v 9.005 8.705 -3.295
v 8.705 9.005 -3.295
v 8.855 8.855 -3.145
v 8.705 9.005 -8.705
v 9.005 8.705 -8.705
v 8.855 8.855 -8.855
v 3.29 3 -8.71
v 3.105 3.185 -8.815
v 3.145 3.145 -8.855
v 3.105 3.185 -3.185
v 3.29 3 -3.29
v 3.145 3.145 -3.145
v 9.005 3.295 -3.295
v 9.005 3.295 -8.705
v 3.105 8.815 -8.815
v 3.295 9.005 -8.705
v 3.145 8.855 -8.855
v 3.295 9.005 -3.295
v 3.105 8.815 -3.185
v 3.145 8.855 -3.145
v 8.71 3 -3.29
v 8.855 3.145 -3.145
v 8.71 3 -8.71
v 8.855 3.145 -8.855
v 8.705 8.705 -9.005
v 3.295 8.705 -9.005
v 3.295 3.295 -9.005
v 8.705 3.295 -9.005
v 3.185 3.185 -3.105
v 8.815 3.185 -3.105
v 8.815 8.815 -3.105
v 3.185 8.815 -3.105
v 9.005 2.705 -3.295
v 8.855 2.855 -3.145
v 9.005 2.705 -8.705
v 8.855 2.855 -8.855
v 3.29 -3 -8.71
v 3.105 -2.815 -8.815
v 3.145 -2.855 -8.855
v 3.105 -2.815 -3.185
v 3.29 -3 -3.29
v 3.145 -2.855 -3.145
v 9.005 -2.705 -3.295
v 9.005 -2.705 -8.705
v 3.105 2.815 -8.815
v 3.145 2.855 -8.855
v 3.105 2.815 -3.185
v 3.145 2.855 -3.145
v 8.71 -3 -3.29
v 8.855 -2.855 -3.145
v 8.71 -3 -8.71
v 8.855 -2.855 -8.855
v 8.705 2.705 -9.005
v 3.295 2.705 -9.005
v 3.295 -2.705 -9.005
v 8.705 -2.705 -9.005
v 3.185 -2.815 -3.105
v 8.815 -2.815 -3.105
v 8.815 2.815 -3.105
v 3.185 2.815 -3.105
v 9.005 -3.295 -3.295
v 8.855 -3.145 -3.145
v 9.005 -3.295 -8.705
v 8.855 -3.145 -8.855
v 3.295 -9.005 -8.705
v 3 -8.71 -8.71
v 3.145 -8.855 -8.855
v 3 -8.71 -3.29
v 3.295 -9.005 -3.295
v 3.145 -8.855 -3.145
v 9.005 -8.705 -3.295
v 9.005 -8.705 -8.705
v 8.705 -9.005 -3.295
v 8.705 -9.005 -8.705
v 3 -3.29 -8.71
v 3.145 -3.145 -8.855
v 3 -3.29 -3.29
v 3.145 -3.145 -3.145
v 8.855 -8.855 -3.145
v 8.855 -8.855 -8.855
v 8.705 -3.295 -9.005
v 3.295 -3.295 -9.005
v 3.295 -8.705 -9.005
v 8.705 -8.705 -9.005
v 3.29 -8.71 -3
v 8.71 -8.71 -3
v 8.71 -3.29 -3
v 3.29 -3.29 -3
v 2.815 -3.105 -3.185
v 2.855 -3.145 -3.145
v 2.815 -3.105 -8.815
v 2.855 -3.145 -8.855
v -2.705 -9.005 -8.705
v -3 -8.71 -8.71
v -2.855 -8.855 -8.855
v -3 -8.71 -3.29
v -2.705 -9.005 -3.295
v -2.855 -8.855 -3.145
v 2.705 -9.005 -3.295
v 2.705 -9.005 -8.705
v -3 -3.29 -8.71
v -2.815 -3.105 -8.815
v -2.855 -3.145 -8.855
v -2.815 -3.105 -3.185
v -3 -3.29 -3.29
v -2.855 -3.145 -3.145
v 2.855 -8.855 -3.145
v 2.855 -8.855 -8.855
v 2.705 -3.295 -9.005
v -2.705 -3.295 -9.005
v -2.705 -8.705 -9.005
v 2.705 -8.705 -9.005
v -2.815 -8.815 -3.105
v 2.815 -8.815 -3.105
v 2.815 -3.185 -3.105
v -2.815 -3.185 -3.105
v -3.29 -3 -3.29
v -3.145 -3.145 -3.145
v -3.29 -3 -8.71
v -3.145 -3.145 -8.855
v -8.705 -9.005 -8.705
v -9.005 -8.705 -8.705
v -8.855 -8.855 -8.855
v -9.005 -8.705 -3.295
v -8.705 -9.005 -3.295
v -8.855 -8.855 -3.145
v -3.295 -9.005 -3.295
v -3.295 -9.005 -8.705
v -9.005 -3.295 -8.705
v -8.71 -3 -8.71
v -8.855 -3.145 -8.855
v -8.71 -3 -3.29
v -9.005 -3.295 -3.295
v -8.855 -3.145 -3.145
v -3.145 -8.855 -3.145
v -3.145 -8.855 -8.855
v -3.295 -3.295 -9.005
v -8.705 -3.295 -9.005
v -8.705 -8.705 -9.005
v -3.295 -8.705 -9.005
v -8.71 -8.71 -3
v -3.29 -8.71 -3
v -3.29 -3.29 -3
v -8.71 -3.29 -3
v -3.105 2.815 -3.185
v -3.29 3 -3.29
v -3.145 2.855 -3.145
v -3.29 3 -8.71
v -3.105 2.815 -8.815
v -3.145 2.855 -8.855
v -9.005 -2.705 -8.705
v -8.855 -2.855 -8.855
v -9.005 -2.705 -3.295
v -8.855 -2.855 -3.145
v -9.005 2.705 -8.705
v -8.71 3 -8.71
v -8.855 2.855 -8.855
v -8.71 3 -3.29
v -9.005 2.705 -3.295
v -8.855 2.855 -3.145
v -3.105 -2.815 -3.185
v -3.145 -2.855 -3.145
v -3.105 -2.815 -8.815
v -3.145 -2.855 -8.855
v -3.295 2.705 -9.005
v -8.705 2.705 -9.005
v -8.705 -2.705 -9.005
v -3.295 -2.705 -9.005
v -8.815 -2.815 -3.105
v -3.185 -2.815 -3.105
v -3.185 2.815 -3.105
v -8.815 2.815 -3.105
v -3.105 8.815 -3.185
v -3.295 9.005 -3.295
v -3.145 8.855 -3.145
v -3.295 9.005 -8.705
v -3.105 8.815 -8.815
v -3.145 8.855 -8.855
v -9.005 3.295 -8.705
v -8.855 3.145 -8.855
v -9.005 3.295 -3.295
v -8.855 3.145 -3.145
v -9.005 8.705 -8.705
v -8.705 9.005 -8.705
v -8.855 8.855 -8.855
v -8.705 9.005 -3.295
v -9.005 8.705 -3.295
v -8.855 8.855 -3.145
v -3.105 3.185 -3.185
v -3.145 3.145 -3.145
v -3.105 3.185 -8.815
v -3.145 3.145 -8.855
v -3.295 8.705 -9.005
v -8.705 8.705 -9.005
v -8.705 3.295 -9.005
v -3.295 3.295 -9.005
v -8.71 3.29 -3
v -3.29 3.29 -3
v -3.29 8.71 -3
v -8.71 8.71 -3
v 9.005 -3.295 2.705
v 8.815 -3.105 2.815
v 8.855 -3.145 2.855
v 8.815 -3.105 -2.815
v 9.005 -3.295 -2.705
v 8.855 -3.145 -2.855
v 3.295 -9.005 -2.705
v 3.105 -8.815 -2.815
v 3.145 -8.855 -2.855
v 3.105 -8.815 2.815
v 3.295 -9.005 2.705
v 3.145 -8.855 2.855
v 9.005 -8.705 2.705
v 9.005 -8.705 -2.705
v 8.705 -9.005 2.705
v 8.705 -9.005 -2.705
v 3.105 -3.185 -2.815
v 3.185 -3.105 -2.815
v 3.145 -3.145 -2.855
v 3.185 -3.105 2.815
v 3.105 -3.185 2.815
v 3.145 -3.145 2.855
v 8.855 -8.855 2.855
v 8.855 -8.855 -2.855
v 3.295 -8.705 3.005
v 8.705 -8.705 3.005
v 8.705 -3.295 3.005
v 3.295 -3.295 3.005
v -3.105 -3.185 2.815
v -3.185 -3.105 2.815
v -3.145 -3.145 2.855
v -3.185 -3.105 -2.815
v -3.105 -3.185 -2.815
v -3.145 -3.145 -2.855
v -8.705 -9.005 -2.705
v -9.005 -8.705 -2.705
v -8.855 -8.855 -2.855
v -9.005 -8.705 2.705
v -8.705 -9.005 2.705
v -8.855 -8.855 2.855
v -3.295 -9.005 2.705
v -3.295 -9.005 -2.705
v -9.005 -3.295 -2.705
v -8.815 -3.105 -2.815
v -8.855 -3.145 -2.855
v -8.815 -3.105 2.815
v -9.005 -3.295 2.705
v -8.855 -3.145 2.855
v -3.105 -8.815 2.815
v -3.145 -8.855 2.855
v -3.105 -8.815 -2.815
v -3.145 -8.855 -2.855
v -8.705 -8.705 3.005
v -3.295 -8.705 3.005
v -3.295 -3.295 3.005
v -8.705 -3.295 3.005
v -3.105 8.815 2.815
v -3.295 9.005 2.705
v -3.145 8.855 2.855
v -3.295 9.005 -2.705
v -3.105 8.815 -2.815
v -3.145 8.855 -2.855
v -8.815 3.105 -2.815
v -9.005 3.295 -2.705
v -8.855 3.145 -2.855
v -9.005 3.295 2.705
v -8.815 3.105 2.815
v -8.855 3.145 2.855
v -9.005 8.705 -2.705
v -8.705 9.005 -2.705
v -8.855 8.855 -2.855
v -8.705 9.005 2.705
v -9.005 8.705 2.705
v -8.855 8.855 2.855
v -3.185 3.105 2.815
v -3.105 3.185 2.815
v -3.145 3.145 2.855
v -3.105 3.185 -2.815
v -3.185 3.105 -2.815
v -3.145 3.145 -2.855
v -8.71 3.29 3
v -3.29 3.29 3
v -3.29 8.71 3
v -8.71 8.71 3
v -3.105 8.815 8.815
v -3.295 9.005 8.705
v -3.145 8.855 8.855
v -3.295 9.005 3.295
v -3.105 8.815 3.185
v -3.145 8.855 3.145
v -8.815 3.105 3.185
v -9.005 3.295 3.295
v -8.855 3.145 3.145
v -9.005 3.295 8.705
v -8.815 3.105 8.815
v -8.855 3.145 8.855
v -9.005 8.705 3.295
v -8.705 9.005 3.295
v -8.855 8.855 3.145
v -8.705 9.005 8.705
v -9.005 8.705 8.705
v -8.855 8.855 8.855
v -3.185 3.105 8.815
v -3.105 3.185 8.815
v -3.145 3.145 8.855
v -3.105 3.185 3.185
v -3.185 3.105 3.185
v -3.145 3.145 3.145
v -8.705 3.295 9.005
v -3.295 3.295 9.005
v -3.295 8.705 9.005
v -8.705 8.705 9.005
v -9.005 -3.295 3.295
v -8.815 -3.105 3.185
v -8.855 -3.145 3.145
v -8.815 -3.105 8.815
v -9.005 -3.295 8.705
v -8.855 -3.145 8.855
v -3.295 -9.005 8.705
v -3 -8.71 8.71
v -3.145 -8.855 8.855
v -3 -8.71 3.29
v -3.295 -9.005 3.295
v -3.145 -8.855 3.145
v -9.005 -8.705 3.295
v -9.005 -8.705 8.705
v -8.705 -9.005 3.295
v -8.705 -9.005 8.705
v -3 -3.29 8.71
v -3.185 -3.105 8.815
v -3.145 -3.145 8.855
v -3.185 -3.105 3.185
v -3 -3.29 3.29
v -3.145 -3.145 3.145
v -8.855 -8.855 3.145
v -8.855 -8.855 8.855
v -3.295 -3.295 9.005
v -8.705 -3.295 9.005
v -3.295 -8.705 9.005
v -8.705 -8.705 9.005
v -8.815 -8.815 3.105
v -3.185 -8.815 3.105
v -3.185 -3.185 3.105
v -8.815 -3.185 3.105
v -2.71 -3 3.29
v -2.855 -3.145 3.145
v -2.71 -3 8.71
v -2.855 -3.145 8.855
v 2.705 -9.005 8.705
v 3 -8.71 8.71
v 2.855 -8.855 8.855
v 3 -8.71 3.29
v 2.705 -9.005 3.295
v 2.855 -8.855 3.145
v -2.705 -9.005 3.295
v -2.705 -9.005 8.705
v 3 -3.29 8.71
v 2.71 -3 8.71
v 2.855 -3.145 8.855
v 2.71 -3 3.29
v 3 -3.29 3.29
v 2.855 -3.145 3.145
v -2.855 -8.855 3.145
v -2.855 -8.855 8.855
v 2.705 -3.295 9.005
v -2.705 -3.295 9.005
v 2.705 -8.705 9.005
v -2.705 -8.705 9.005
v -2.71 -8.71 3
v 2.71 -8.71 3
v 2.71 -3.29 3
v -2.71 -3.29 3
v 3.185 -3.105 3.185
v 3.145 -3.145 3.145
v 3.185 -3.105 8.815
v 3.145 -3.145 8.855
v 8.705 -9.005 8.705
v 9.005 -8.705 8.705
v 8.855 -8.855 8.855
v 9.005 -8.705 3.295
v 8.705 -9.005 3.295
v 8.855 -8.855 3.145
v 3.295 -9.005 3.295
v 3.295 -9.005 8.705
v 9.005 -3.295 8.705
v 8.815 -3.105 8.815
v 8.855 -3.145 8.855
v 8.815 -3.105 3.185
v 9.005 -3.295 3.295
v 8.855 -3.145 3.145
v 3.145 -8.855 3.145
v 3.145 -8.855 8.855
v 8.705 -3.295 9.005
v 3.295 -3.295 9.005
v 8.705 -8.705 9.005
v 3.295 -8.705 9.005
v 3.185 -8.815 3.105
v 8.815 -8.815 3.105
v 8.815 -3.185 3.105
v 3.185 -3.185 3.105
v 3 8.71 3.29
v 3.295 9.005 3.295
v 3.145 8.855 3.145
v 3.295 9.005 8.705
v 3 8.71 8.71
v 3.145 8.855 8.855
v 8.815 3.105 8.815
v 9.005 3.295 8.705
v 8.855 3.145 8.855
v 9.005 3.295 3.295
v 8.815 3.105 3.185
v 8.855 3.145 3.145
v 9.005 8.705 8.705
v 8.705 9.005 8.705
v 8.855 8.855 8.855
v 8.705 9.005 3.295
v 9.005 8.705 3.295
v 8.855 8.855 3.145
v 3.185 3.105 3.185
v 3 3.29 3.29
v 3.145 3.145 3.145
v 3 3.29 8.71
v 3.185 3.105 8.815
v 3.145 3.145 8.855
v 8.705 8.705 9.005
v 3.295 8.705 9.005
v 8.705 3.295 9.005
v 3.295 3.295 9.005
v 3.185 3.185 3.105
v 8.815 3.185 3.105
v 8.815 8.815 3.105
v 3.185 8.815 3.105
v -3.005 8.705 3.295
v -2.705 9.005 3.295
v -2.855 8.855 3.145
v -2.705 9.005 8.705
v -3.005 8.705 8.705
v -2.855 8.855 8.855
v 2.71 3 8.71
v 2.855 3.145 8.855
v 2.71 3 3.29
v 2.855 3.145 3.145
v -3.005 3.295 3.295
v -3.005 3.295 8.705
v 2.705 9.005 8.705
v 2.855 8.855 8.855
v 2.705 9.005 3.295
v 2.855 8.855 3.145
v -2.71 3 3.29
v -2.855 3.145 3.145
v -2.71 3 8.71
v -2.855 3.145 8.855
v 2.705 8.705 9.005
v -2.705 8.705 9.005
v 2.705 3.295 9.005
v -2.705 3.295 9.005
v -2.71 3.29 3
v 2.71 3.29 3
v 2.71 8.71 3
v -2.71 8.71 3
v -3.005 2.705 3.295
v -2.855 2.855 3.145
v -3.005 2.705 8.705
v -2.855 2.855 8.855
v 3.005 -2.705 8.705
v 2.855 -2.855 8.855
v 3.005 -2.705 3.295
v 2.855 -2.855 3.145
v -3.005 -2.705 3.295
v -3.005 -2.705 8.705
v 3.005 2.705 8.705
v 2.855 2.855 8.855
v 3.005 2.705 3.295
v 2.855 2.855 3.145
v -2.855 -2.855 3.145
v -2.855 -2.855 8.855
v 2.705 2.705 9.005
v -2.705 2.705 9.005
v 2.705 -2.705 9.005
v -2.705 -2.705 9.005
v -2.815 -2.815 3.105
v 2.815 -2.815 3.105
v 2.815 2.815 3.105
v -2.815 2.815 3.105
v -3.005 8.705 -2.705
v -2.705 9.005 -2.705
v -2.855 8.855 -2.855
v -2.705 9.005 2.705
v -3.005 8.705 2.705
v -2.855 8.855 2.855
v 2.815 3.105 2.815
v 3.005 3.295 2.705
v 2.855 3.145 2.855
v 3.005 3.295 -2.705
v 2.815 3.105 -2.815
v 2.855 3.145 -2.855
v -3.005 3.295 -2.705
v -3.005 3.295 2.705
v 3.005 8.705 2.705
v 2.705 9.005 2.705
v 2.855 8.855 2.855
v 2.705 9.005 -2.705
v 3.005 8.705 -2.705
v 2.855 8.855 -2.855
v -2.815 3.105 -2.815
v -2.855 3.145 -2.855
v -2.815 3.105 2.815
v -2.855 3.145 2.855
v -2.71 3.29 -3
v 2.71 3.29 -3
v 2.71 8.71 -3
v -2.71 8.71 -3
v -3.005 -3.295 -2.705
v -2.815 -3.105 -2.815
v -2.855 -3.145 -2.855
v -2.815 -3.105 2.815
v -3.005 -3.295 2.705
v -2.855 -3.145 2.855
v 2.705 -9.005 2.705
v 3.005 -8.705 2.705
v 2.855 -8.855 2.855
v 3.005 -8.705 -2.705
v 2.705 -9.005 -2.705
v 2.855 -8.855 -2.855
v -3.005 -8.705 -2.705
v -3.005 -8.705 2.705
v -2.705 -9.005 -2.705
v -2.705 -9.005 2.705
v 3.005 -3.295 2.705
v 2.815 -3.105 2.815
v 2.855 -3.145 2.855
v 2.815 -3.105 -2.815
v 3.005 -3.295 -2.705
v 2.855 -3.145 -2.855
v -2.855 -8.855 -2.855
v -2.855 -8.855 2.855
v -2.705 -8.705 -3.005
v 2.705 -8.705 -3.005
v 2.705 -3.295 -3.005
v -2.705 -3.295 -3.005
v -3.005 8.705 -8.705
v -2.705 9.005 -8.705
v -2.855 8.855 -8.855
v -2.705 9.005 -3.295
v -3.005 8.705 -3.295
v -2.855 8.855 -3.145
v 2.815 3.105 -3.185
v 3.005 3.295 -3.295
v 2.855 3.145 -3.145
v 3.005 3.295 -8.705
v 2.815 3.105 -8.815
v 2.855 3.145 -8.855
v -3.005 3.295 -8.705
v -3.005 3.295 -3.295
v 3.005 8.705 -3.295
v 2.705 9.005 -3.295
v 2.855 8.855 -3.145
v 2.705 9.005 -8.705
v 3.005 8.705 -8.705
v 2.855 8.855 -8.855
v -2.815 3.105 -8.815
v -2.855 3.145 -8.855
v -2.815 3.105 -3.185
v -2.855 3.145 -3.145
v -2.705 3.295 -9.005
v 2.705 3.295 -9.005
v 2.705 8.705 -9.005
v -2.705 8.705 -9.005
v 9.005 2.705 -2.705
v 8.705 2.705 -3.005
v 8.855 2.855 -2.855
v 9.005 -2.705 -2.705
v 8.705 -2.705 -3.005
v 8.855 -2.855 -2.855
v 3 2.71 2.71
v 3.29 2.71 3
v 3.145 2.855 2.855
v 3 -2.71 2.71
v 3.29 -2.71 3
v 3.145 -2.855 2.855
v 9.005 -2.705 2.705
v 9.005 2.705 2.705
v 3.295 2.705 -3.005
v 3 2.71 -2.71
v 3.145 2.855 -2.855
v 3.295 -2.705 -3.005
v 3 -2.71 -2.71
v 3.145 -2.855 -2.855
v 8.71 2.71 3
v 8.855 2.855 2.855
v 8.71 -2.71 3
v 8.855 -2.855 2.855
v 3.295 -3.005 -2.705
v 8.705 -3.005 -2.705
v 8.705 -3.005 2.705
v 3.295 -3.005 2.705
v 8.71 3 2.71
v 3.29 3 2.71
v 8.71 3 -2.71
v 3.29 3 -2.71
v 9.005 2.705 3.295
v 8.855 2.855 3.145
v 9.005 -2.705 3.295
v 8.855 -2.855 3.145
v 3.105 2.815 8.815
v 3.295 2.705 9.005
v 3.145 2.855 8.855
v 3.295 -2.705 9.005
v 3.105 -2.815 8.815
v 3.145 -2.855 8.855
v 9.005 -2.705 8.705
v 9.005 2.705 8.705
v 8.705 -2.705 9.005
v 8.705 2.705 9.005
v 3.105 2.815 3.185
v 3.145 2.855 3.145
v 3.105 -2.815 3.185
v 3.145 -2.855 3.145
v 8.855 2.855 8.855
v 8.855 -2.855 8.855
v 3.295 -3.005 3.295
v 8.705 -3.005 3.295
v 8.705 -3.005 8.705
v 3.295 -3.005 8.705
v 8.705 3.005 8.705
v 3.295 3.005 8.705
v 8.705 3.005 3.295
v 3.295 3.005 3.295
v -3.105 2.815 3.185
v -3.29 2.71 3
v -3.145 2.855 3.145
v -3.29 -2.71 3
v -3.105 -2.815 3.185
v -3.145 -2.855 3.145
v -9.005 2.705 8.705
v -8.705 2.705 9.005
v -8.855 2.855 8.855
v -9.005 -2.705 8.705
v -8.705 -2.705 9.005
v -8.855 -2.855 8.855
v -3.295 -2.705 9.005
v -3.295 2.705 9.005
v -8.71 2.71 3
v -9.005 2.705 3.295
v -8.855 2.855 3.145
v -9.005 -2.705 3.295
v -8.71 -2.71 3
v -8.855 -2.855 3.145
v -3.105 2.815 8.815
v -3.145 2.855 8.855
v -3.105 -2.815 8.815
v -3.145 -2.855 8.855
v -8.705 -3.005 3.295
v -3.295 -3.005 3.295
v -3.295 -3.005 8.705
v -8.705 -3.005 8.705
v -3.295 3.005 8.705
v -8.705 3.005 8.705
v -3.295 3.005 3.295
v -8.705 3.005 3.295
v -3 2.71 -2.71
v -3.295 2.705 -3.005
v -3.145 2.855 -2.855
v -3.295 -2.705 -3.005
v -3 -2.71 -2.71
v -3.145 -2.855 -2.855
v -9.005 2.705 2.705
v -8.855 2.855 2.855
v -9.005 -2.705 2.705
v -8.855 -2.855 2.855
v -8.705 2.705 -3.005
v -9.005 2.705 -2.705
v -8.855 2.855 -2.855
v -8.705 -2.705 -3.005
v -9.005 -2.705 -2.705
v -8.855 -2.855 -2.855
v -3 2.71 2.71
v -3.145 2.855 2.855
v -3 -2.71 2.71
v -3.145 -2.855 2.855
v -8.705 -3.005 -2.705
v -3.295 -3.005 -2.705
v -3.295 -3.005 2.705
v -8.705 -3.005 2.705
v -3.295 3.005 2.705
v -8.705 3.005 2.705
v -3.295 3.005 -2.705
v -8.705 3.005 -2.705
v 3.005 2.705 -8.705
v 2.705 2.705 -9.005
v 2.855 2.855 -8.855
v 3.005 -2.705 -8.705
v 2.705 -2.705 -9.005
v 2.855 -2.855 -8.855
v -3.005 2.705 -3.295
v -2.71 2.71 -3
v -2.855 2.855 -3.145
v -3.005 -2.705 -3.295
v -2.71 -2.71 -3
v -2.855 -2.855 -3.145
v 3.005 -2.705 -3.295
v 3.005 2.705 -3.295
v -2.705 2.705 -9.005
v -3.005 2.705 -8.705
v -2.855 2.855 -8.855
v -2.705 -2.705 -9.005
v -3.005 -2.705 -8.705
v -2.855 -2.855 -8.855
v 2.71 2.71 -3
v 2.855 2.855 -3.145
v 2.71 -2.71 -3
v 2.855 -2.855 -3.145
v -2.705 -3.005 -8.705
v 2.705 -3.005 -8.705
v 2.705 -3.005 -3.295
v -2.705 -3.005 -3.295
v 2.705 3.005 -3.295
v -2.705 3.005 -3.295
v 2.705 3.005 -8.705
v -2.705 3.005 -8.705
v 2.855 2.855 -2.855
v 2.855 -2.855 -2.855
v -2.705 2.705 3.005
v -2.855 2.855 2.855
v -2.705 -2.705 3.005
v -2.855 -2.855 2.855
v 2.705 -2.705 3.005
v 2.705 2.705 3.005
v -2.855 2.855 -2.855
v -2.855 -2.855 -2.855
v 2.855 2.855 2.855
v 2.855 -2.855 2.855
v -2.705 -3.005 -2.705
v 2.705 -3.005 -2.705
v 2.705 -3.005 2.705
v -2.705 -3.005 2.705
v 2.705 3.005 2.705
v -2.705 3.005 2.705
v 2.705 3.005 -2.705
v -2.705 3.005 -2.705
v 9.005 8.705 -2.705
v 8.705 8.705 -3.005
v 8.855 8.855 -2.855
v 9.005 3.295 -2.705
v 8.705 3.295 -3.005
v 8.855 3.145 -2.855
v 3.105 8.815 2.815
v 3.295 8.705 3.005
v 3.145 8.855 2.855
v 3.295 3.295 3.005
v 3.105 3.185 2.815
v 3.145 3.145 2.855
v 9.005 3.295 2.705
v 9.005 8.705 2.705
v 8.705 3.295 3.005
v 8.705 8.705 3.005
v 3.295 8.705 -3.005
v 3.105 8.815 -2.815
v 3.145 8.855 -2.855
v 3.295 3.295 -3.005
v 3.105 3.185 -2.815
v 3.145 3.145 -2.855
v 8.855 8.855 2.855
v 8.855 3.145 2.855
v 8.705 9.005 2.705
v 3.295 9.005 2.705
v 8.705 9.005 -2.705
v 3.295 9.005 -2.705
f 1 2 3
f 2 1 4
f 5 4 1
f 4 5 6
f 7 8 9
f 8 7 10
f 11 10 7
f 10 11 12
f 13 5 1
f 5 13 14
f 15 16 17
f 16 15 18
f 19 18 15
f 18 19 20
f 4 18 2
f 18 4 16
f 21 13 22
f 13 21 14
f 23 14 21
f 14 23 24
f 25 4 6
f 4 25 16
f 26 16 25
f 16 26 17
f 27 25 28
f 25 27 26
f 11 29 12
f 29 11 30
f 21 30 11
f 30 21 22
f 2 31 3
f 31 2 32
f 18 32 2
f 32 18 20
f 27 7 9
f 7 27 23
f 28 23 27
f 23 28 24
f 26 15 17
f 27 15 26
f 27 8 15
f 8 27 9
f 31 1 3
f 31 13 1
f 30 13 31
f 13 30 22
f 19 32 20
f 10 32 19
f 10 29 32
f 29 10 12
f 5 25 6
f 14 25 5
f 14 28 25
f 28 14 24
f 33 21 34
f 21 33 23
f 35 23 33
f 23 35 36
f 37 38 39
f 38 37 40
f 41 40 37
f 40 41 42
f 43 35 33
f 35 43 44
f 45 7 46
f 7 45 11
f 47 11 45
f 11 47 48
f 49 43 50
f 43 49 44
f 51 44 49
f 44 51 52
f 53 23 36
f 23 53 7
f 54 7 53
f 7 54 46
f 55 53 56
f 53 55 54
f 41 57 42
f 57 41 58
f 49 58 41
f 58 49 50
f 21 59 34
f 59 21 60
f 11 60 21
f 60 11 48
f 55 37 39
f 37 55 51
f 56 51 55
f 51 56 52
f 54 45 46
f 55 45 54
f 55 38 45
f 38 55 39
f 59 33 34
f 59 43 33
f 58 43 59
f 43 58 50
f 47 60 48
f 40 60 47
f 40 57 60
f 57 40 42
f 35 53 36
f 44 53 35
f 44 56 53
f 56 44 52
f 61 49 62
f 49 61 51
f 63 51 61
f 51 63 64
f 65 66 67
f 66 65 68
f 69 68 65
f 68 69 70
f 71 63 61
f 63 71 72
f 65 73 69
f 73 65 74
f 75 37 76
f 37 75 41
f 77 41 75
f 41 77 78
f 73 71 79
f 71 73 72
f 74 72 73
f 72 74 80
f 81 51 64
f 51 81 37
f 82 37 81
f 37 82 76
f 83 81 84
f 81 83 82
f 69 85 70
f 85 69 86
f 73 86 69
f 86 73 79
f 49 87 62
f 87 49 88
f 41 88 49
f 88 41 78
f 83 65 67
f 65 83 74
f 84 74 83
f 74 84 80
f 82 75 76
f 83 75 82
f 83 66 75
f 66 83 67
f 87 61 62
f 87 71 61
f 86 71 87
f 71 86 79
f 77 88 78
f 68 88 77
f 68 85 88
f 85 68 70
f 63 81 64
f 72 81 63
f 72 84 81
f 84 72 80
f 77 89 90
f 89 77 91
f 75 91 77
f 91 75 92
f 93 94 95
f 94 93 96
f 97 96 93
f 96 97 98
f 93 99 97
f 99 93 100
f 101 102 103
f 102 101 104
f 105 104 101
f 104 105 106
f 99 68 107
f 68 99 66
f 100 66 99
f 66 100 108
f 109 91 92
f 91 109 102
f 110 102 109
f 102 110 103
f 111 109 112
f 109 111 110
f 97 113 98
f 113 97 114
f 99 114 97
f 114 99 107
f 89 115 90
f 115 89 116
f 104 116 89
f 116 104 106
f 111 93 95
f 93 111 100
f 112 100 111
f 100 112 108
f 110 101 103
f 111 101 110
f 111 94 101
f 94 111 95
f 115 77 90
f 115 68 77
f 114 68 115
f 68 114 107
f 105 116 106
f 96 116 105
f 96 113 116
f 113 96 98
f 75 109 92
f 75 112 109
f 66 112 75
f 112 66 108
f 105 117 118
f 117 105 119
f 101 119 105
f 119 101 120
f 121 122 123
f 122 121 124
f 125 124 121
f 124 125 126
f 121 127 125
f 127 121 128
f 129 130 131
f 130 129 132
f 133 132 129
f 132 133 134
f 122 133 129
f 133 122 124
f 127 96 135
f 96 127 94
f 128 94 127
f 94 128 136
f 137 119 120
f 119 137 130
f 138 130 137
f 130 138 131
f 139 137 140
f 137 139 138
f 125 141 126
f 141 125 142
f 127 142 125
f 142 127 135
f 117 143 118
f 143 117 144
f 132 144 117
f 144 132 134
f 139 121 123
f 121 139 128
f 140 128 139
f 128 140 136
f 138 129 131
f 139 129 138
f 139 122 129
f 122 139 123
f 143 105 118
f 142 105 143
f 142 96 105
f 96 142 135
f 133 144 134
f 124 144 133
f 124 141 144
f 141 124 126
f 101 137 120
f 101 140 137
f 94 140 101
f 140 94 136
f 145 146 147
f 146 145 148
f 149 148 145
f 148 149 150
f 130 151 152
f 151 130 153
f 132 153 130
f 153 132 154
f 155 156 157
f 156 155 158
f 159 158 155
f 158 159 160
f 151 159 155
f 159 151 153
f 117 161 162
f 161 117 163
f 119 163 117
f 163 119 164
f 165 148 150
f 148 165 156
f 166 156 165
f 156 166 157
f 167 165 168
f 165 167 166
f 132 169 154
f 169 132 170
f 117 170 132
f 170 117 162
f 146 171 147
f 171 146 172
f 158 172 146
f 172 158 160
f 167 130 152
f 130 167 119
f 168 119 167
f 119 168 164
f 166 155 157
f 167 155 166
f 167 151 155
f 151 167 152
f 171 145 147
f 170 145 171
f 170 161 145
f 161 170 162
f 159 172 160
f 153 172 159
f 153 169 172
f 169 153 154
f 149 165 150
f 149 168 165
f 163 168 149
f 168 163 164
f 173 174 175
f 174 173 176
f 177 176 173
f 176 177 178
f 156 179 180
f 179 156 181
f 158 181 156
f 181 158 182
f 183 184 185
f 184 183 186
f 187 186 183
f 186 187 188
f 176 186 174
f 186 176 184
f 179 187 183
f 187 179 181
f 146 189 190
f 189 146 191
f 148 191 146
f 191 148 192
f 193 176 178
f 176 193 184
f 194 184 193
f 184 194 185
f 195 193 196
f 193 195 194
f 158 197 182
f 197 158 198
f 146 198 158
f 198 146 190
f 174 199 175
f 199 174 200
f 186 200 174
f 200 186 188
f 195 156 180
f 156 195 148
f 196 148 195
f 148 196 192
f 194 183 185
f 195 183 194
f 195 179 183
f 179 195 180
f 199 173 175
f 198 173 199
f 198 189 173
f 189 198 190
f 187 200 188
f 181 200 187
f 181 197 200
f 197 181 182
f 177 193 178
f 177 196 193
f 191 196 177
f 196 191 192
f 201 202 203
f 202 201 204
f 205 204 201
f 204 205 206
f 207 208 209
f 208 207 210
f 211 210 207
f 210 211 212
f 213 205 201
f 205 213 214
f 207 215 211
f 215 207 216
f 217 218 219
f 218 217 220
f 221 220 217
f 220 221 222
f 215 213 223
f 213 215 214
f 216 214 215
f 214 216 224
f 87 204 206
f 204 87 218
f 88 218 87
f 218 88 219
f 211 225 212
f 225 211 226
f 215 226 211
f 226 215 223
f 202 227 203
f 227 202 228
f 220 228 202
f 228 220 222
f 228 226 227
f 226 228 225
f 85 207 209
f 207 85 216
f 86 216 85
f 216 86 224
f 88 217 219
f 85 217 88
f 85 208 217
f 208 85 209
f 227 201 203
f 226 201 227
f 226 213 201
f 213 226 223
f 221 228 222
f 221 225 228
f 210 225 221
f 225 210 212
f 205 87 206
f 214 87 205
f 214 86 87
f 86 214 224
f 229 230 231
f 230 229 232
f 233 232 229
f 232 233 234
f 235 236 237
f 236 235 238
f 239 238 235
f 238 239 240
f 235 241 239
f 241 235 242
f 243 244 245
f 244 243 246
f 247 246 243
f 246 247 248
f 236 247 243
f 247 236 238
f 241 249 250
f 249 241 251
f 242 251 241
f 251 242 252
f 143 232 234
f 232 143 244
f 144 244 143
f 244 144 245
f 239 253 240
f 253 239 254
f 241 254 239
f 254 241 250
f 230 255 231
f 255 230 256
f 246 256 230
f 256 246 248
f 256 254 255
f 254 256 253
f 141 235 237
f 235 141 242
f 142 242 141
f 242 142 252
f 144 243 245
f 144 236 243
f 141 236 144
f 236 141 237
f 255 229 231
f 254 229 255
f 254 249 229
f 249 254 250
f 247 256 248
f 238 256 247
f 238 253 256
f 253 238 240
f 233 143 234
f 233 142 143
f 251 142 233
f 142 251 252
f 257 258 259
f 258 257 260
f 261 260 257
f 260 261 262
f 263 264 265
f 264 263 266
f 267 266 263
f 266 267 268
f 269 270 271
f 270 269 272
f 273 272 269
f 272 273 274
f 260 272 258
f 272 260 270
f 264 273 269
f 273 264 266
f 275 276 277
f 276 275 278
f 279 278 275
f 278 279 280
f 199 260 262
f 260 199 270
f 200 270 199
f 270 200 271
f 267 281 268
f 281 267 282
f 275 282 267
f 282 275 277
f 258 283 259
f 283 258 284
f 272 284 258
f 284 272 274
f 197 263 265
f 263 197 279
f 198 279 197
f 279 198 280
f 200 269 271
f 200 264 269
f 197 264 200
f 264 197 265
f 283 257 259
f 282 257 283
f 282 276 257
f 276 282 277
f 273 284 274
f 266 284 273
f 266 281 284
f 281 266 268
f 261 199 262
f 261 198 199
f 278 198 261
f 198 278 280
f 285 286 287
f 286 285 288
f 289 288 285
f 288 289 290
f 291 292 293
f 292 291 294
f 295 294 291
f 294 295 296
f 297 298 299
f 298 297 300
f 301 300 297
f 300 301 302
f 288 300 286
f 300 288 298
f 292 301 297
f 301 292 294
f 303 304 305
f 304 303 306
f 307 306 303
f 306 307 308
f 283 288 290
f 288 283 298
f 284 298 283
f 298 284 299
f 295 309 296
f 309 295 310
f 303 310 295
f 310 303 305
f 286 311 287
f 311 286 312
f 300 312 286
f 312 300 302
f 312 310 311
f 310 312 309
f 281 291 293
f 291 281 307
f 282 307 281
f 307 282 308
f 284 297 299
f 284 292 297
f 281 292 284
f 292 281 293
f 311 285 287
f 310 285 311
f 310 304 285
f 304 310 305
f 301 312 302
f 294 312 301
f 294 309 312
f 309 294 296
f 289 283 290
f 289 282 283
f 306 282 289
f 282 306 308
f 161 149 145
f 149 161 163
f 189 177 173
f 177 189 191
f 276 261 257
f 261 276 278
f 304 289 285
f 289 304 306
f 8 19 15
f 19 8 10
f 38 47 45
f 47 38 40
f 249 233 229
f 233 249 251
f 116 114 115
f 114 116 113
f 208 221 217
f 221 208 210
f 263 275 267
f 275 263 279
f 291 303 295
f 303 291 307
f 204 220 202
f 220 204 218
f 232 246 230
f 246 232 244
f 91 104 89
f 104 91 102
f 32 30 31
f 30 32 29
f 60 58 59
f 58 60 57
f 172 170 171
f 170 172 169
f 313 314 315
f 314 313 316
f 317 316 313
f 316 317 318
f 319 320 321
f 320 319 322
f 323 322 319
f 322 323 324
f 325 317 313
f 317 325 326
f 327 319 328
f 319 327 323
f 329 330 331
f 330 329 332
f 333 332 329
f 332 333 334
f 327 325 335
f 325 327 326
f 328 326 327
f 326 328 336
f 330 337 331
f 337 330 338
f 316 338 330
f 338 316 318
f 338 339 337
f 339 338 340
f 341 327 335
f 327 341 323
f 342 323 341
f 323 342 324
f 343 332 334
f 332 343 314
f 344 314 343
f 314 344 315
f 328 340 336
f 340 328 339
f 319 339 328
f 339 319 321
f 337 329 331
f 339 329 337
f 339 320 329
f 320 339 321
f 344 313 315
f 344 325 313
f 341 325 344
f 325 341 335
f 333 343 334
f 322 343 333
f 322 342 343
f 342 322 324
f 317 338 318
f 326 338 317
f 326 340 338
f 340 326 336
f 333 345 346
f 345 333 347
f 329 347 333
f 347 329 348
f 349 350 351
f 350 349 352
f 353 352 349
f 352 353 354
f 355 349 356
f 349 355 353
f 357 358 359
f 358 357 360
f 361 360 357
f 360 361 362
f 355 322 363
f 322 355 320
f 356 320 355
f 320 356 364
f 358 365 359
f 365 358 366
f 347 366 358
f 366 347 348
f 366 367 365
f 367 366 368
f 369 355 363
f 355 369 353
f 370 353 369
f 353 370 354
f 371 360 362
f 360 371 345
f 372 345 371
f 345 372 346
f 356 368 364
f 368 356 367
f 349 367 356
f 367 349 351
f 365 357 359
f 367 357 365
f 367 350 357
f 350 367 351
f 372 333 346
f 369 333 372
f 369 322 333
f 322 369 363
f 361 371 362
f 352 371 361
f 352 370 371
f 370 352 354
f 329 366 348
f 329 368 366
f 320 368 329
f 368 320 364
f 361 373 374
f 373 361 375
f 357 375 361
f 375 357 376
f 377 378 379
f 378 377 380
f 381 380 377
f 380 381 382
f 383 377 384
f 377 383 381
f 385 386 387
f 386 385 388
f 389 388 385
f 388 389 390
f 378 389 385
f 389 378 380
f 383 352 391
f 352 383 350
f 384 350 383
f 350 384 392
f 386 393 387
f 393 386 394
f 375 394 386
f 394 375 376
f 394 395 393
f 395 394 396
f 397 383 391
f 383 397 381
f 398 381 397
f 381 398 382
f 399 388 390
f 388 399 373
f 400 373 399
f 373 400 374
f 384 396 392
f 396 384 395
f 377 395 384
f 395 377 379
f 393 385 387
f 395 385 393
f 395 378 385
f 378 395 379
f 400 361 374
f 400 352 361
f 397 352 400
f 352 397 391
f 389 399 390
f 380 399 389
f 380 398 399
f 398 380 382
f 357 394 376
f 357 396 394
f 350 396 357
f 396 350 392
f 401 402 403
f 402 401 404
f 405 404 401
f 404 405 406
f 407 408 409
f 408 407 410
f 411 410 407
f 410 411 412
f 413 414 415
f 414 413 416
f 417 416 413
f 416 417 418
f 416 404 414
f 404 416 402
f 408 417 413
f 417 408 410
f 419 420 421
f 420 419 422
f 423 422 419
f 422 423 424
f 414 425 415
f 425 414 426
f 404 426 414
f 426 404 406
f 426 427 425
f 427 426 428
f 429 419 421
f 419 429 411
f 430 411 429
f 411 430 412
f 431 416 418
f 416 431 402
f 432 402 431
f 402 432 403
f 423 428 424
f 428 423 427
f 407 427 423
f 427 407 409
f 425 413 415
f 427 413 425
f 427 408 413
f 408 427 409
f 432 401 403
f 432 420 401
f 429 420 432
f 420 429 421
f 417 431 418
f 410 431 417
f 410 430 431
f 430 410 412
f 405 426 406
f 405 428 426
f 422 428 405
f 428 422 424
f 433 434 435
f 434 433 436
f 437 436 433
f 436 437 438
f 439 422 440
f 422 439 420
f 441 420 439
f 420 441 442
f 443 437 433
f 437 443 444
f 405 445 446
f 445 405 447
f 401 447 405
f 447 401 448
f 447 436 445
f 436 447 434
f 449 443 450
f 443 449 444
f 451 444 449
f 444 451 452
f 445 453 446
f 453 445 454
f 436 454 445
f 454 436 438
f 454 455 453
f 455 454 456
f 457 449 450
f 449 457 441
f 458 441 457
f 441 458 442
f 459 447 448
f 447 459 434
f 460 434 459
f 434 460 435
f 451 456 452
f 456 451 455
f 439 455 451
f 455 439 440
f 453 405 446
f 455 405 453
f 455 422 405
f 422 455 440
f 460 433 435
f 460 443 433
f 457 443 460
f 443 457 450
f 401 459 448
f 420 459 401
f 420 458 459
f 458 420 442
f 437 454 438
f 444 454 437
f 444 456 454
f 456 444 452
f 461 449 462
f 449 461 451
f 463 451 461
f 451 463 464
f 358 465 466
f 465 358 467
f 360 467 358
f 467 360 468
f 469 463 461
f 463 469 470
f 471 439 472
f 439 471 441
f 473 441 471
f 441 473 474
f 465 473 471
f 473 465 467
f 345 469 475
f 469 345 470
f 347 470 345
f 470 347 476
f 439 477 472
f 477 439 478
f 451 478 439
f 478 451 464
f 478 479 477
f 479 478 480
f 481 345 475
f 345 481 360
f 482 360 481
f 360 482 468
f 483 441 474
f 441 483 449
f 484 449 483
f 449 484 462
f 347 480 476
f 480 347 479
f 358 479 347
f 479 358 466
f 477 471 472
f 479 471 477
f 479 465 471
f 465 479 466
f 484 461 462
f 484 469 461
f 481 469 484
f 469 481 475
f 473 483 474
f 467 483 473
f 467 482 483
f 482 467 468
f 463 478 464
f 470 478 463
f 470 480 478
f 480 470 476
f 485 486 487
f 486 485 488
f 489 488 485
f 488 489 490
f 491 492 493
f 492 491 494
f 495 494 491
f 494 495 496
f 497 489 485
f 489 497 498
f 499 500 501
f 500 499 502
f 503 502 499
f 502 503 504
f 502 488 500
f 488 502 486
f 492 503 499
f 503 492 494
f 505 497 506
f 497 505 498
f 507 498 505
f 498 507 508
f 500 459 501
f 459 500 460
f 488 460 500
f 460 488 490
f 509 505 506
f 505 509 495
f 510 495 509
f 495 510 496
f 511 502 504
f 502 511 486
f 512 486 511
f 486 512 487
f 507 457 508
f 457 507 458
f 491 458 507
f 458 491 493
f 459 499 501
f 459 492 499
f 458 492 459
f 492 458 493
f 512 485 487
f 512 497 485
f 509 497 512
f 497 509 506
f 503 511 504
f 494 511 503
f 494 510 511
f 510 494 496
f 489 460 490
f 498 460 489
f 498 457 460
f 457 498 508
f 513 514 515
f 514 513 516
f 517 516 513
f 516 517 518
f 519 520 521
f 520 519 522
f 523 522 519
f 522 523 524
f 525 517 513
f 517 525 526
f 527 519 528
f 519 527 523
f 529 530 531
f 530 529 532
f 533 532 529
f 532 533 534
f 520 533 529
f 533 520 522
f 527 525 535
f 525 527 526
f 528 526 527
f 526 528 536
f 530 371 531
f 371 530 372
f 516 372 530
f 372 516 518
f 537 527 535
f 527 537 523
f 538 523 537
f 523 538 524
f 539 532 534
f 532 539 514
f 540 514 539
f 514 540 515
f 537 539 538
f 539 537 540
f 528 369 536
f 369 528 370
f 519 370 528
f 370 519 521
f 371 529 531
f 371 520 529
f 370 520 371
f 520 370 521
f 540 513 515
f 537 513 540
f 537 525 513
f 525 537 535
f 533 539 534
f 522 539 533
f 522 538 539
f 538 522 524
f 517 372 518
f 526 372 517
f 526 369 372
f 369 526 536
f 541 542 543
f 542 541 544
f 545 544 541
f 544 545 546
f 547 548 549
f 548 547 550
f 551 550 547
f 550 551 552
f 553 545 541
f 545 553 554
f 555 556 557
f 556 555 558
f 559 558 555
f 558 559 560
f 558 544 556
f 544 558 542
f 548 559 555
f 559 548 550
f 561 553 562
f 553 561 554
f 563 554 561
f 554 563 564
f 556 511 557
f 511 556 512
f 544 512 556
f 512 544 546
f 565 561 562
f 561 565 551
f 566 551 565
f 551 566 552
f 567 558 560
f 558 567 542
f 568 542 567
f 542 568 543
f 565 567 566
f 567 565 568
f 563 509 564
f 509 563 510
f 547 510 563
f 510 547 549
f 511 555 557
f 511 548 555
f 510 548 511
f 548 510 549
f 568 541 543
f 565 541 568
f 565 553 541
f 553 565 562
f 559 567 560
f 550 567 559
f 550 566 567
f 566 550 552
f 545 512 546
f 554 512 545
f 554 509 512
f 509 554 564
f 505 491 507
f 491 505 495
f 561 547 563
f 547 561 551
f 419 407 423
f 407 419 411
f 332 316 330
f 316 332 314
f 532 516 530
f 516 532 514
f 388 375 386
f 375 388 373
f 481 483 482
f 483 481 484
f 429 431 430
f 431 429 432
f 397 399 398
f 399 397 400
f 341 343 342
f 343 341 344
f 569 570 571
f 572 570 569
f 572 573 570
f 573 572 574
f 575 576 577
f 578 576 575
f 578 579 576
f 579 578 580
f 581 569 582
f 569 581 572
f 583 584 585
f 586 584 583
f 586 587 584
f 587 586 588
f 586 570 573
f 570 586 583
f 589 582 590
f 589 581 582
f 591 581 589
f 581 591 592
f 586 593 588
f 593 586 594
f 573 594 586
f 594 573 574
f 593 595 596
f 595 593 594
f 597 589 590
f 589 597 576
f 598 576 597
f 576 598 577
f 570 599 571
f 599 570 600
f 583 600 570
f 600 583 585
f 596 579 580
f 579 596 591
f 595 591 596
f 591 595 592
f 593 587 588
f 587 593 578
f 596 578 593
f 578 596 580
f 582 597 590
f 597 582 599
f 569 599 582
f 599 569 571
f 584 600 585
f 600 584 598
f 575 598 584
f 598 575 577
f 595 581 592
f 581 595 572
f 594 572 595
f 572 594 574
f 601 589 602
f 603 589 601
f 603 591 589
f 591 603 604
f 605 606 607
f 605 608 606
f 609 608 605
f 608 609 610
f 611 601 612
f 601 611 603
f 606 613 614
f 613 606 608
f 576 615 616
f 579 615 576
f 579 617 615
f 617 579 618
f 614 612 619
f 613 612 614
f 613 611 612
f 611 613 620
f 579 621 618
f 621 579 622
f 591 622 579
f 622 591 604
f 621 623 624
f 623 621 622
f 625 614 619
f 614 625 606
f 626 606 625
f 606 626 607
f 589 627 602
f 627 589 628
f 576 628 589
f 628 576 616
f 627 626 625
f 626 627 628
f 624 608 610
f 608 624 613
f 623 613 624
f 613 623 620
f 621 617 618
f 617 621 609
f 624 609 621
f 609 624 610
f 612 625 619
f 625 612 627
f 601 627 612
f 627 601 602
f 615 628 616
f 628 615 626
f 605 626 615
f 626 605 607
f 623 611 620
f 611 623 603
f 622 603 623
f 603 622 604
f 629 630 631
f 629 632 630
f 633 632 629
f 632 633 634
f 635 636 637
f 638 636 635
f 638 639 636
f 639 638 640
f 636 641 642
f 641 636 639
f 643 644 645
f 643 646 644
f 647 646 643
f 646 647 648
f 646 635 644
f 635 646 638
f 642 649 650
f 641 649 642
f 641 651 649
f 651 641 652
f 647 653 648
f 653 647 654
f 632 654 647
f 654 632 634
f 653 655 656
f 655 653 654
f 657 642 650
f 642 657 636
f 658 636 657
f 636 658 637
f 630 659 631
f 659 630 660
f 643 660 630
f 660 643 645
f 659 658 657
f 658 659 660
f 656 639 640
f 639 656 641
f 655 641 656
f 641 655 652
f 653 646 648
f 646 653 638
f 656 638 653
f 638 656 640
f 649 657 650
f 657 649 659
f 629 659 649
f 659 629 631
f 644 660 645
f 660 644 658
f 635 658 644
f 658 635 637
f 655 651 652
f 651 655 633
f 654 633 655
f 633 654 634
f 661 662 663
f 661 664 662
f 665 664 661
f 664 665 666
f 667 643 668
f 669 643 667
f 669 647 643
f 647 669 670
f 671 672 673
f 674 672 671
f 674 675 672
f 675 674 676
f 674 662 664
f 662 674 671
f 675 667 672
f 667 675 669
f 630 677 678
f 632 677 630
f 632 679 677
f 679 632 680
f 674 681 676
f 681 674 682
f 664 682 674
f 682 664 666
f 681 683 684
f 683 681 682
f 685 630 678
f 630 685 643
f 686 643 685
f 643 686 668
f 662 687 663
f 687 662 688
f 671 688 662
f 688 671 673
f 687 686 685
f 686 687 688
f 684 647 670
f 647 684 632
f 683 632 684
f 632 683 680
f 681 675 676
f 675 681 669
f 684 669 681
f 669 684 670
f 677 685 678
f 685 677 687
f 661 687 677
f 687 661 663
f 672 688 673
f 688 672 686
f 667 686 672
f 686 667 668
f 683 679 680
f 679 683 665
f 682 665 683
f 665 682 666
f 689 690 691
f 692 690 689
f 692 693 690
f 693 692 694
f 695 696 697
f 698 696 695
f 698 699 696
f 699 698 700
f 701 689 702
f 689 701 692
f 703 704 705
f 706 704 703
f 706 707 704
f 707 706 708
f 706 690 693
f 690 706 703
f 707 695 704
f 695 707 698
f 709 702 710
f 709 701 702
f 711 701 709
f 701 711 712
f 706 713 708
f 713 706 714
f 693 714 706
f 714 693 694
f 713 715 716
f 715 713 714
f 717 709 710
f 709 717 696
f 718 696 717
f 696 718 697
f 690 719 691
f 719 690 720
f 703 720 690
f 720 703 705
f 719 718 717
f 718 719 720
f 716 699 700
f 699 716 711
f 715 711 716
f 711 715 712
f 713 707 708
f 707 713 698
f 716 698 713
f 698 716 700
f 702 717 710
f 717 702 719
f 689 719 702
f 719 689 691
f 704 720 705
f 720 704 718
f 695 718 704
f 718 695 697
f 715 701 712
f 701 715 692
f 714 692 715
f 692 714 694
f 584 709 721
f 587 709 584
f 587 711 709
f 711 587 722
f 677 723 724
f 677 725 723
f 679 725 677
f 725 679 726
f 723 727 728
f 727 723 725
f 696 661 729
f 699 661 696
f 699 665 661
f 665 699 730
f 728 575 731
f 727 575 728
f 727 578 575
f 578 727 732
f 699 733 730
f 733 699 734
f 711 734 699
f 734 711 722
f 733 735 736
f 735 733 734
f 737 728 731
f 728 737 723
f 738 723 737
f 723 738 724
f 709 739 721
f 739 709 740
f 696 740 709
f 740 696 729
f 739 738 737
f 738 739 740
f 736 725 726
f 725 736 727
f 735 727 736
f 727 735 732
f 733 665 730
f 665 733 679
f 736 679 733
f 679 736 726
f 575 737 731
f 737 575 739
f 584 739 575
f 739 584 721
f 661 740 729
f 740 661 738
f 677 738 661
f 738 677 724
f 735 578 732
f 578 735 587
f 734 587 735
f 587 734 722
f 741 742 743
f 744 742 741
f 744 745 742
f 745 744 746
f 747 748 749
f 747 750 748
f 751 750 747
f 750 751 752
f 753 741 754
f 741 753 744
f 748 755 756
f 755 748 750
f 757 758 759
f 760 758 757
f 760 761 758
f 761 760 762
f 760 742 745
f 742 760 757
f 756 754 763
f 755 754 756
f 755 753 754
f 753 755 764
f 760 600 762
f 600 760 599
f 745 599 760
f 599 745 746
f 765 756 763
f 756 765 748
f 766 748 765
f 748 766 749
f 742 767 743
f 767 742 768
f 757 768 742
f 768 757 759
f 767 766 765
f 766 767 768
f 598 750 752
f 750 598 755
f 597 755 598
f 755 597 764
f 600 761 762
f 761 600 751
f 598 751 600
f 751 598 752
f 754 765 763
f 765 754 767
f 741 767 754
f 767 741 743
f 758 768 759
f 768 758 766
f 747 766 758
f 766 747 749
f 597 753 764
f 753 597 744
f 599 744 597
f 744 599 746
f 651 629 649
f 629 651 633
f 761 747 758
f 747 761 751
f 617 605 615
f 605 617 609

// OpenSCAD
/* [Global] */
/* [Settings] */
part="assembled"; //[first:Piece 1,second:Piece 2,third:Piece 3,assembled:All assembled]
//of the assembled cube
total_size=18;
cube_size=total_size/3;
//between the parts
gap=0.2;//[0:0.01:0.5]
//reciprocal size of the chamfer
chamfer_size=20; //[4:50]
corner=cube_size/chamfer_size; //<=cube_size/4

/* [Hidden] */
eps=0.01;

print_part();


module print_part() {
	if (part == "first") {
		final_piece1();
	} else if (part == "second") {
		final_piece2();
	} else if (part == "third") {
		final_piece3();
	} else {
		assembled();
	}
}

module piece1(chamfer=true)
{
    set_cube(1,1,-1,chamfer);
    set_cube(1,0,-1,chamfer);
    set_cube(1,-1,-1,chamfer);
    set_cube(0,-1,-1,chamfer);
    set_cube(-1,-1,-1,chamfer);
    set_cube(-1,0,-1,chamfer);
    set_cube(-1,1,-1,chamfer);
    set_cube(1,-1,0,chamfer);
    set_cube(-1,-1,0,chamfer);
    set_cube(-1,1,0,chamfer);
    set_cube(-1,1,1,chamfer);
}
module piece2(chamfer=true)
{
    set_cube(-1,1,-1,chamfer);
    set_cube(0,1,-1,chamfer);
    set_cube(0,0,-1,chamfer);
    set_cube(1,-1,-1,chamfer);
    set_cube(0,-1,-1,chamfer);
    set_cube(-1,-1,-1,chamfer);
    set_cube(0,1,0,chamfer);
    set_cube(0,-1,0,chamfer);
    set_cube(0,1,1,chamfer);
}
module piece3(chamfer=true)
{
    set_cube(1,0,-1,chamfer);
    set_cube(1,-1,-1,chamfer);
    set_cube(-1,-1,-1,chamfer);
    set_cube(-1,0,-1,chamfer);
    set_cube(0,0,-1,chamfer);
    set_cube(0,1,-1,chamfer);
    set_cube(1,0,0,chamfer);
}

module assembled()
{
    color("red")
    final_piece1();
    color("green")
    rotate([180,0,180])
    final_piece2();
    color("blue")
    translate([0,cube_size,0])
    rotate([-90,0,0])
    final_piece3();
}

module set_cube(x,y,z,chamfer=true)
{
    translate([x*cube_size,y*cube_size,z*cube_size])
    if (chamfer)
        chamfer_cube(cube_size+eps,cube_size+eps,cube_size+eps,corner);
    else
        cube([cube_size+eps,cube_size+eps,cube_size+eps],center=true);
}

module chamfer_cube(x,y,z,delta)
{
    intersection()
    {
    size=x;
        linear_extrude(z,center=true)
            chamfer_square(x,y,delta);
        rotate([0,90,0])
            linear_extrude(x,center=true)
            chamfer_square(z,y,delta);
        rotate([90,0,0])
            linear_extrude(y,center=true)
            chamfer_square(x,z,delta);
    }
}

module chamfer_square(x,y,delta)
{
    offset(r=-delta,chamfer=true){
        square([x,y+2*delta],center=true);
        square([x+2*delta,y],center=true);
    }
}

module final_piece1()
{
    difference() //for the gap
    {
        piece1();
        scale(1+gap/cube_size)
        {
        rotate([180,0,180])
            piece2(chamfer=false);
        translate([0,cube_size,0])
            rotate([-90,0,0])
                piece3(chamfer=false);
        }
    }
}

module final_piece2()
{
    difference() //for the gap
    {
        piece2();
        rotate([180,0,180])
        scale(1+gap/cube_size)
        {
            piece1(chamfer=false);
            translate([0,cube_size,0])
                rotate([-90,0,0])
                    piece3(chamfer=false);
        }
    }
}

module final_piece3()
{
    difference() //for the gap
    {
        piece3();
        translate([0,0,-cube_size])
        rotate([90,0,0])
        scale(1+gap/cube_size)
        {
            piece1(chamfer=false);
        rotate([180,0,180])
            piece2(chamfer=false);
        }
    }
}
